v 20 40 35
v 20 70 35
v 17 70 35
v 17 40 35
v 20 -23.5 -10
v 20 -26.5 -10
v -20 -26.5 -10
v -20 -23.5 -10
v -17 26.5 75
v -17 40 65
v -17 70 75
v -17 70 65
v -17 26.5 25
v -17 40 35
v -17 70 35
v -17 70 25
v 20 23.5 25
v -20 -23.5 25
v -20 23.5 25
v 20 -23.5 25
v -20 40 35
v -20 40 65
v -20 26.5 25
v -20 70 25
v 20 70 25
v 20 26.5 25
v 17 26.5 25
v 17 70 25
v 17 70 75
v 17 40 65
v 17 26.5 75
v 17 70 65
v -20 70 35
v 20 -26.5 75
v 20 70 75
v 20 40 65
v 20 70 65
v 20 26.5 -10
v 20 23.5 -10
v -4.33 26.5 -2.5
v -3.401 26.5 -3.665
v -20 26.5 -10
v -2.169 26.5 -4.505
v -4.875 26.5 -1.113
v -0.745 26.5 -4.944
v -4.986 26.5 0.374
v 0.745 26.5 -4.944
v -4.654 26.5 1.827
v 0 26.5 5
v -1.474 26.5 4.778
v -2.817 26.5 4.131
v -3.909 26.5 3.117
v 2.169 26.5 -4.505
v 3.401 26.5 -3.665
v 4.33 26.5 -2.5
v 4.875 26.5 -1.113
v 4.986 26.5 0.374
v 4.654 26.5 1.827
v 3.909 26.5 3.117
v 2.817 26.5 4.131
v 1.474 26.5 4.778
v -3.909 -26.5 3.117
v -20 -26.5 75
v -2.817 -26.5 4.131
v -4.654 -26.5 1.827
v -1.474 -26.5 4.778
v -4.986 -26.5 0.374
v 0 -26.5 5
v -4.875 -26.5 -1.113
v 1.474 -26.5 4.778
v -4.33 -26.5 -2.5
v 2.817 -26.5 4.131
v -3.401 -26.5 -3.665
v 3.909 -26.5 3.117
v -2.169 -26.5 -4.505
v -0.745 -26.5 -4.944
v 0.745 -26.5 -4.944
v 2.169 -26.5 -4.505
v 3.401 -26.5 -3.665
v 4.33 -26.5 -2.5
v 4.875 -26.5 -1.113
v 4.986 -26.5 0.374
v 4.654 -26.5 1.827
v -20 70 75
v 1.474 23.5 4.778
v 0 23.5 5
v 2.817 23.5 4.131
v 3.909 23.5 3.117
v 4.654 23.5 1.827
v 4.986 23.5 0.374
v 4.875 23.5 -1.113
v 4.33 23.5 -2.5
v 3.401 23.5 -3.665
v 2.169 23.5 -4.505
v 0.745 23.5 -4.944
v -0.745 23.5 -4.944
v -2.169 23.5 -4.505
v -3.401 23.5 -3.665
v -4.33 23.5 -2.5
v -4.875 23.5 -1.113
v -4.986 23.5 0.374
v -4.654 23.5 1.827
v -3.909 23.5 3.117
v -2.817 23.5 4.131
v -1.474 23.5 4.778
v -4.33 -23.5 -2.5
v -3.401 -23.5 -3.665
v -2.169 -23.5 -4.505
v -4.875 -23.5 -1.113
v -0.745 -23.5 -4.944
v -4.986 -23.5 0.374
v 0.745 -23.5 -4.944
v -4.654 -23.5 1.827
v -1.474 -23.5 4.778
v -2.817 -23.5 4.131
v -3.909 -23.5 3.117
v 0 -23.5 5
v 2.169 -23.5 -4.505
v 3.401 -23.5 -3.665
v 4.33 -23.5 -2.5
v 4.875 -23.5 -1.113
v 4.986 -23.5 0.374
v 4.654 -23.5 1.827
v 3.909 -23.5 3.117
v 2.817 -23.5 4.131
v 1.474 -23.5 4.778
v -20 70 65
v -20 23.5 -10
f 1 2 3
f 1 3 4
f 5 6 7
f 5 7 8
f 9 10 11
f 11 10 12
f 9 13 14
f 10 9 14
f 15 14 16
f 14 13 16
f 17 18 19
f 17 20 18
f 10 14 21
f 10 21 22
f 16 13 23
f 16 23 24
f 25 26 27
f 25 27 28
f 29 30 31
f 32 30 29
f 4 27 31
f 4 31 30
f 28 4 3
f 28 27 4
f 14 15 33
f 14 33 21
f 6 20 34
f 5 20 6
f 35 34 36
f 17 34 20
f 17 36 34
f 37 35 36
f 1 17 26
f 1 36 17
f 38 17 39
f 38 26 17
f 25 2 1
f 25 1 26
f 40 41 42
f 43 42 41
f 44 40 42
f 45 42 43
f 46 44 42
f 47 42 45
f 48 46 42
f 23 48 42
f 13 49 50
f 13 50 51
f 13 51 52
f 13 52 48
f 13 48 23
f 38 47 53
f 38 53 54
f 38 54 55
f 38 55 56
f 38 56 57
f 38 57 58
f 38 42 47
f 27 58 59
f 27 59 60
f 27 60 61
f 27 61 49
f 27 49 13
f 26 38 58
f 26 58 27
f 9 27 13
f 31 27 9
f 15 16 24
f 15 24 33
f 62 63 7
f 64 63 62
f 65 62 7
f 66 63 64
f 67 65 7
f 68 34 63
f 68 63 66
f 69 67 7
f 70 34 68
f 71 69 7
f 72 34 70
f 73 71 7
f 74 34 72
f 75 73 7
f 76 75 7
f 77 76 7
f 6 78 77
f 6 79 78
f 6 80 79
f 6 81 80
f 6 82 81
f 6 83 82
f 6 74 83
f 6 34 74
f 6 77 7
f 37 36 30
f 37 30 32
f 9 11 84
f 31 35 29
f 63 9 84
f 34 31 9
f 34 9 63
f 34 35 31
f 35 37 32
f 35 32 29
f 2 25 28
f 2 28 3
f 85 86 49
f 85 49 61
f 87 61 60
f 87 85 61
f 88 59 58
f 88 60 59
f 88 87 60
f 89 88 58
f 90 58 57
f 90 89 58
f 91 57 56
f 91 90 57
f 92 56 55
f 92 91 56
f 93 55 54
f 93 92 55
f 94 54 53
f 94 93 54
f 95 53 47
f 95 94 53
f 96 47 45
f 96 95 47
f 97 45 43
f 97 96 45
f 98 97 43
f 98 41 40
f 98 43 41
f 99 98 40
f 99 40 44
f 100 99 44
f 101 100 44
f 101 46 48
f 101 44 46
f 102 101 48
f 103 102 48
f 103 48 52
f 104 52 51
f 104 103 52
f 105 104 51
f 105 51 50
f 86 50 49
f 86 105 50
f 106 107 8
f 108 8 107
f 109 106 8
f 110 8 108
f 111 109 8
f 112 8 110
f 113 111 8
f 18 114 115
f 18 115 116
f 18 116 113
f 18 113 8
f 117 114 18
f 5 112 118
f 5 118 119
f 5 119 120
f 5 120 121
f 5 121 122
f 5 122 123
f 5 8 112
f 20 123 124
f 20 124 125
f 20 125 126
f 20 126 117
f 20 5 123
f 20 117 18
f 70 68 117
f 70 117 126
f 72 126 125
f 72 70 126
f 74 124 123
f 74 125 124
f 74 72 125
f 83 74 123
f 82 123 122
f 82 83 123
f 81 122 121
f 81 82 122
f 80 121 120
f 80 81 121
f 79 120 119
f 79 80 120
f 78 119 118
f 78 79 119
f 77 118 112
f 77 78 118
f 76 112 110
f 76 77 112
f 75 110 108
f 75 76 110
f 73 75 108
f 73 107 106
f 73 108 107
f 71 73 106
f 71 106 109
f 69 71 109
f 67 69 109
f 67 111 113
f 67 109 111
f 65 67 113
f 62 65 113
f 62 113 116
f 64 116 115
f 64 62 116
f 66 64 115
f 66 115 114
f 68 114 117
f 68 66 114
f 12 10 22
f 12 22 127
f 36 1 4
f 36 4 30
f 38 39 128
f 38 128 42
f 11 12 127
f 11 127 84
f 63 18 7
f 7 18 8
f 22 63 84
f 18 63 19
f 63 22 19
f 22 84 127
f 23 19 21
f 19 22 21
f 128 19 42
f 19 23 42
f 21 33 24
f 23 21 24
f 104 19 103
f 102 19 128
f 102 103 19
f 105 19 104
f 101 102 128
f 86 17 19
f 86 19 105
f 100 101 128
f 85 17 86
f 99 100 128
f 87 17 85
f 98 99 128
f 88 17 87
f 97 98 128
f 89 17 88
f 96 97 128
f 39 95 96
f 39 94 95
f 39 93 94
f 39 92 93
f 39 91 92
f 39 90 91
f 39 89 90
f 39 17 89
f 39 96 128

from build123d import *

# Parameters (mm, degrees)
AUFSATZ_LINEAR_AUSTRAGEN1_DEPTH      = 20
SKIZZE2_W                            = 34
SKIZZE2_H                            = 43.5
SCHNITT_LINEAR_AUSTRAGEN1_DEPTH      = 105.522724802
SCHNITT_LINEAR_AUSTRAGEN2_DEPTH      = 105.522724802
SCHNITT_LINEAR_AUSTRAGEN2_DEPTH_BACK = 105.522724802
SKIZZE3_R                            = 5


with BuildPart() as part:
    # Skizze1 → Aufsatz-Linear austragen1 (new, symmetric)
    with BuildSketch(Plane(origin=(0, 0, 0), x_dir=(0, 0, -1), z_dir=(1, 0, 0))):
        Polygon((-25, 23.5), (10, 23.5), (10, 26.5), (-25, 26.5), (-25, 70), (-35, 70), (-35, 40), (-65, 40), (-65, 70), (-75, 70), (-75, -26.5), (10, -26.5), (10, -23.5), (-25, -23.5), align=None)
    extrude(amount=AUFSATZ_LINEAR_AUSTRAGEN1_DEPTH, both=True)

    # Skizze2 → Schnitt-Linear austragen1 (cut, through all)
    with BuildSketch(Plane.XY):
        with Locations((0, 48.25)):
            Rectangle(SKIZZE2_W, SKIZZE2_H)
    extrude(amount=SCHNITT_LINEAR_AUSTRAGEN1_DEPTH, mode=Mode.SUBTRACT)

    # Skizze3 → Schnitt-Linear austragen2 (cut, two sides: drawn at the far end of the back side and taken through both)
    with BuildSketch(Plane(origin=(0, 0, 0), x_dir=(1, 0, 0), z_dir=(0, 1, 0)).offset(-SCHNITT_LINEAR_AUSTRAGEN2_DEPTH_BACK)):
        with Locations(Location((0, 0, 0), (0, 0, 270))):
            Circle(SKIZZE3_R)
    extrude(amount=SCHNITT_LINEAR_AUSTRAGEN2_DEPTH + SCHNITT_LINEAR_AUSTRAGEN2_DEPTH_BACK, mode=Mode.SUBTRACT)


solid = part.part
